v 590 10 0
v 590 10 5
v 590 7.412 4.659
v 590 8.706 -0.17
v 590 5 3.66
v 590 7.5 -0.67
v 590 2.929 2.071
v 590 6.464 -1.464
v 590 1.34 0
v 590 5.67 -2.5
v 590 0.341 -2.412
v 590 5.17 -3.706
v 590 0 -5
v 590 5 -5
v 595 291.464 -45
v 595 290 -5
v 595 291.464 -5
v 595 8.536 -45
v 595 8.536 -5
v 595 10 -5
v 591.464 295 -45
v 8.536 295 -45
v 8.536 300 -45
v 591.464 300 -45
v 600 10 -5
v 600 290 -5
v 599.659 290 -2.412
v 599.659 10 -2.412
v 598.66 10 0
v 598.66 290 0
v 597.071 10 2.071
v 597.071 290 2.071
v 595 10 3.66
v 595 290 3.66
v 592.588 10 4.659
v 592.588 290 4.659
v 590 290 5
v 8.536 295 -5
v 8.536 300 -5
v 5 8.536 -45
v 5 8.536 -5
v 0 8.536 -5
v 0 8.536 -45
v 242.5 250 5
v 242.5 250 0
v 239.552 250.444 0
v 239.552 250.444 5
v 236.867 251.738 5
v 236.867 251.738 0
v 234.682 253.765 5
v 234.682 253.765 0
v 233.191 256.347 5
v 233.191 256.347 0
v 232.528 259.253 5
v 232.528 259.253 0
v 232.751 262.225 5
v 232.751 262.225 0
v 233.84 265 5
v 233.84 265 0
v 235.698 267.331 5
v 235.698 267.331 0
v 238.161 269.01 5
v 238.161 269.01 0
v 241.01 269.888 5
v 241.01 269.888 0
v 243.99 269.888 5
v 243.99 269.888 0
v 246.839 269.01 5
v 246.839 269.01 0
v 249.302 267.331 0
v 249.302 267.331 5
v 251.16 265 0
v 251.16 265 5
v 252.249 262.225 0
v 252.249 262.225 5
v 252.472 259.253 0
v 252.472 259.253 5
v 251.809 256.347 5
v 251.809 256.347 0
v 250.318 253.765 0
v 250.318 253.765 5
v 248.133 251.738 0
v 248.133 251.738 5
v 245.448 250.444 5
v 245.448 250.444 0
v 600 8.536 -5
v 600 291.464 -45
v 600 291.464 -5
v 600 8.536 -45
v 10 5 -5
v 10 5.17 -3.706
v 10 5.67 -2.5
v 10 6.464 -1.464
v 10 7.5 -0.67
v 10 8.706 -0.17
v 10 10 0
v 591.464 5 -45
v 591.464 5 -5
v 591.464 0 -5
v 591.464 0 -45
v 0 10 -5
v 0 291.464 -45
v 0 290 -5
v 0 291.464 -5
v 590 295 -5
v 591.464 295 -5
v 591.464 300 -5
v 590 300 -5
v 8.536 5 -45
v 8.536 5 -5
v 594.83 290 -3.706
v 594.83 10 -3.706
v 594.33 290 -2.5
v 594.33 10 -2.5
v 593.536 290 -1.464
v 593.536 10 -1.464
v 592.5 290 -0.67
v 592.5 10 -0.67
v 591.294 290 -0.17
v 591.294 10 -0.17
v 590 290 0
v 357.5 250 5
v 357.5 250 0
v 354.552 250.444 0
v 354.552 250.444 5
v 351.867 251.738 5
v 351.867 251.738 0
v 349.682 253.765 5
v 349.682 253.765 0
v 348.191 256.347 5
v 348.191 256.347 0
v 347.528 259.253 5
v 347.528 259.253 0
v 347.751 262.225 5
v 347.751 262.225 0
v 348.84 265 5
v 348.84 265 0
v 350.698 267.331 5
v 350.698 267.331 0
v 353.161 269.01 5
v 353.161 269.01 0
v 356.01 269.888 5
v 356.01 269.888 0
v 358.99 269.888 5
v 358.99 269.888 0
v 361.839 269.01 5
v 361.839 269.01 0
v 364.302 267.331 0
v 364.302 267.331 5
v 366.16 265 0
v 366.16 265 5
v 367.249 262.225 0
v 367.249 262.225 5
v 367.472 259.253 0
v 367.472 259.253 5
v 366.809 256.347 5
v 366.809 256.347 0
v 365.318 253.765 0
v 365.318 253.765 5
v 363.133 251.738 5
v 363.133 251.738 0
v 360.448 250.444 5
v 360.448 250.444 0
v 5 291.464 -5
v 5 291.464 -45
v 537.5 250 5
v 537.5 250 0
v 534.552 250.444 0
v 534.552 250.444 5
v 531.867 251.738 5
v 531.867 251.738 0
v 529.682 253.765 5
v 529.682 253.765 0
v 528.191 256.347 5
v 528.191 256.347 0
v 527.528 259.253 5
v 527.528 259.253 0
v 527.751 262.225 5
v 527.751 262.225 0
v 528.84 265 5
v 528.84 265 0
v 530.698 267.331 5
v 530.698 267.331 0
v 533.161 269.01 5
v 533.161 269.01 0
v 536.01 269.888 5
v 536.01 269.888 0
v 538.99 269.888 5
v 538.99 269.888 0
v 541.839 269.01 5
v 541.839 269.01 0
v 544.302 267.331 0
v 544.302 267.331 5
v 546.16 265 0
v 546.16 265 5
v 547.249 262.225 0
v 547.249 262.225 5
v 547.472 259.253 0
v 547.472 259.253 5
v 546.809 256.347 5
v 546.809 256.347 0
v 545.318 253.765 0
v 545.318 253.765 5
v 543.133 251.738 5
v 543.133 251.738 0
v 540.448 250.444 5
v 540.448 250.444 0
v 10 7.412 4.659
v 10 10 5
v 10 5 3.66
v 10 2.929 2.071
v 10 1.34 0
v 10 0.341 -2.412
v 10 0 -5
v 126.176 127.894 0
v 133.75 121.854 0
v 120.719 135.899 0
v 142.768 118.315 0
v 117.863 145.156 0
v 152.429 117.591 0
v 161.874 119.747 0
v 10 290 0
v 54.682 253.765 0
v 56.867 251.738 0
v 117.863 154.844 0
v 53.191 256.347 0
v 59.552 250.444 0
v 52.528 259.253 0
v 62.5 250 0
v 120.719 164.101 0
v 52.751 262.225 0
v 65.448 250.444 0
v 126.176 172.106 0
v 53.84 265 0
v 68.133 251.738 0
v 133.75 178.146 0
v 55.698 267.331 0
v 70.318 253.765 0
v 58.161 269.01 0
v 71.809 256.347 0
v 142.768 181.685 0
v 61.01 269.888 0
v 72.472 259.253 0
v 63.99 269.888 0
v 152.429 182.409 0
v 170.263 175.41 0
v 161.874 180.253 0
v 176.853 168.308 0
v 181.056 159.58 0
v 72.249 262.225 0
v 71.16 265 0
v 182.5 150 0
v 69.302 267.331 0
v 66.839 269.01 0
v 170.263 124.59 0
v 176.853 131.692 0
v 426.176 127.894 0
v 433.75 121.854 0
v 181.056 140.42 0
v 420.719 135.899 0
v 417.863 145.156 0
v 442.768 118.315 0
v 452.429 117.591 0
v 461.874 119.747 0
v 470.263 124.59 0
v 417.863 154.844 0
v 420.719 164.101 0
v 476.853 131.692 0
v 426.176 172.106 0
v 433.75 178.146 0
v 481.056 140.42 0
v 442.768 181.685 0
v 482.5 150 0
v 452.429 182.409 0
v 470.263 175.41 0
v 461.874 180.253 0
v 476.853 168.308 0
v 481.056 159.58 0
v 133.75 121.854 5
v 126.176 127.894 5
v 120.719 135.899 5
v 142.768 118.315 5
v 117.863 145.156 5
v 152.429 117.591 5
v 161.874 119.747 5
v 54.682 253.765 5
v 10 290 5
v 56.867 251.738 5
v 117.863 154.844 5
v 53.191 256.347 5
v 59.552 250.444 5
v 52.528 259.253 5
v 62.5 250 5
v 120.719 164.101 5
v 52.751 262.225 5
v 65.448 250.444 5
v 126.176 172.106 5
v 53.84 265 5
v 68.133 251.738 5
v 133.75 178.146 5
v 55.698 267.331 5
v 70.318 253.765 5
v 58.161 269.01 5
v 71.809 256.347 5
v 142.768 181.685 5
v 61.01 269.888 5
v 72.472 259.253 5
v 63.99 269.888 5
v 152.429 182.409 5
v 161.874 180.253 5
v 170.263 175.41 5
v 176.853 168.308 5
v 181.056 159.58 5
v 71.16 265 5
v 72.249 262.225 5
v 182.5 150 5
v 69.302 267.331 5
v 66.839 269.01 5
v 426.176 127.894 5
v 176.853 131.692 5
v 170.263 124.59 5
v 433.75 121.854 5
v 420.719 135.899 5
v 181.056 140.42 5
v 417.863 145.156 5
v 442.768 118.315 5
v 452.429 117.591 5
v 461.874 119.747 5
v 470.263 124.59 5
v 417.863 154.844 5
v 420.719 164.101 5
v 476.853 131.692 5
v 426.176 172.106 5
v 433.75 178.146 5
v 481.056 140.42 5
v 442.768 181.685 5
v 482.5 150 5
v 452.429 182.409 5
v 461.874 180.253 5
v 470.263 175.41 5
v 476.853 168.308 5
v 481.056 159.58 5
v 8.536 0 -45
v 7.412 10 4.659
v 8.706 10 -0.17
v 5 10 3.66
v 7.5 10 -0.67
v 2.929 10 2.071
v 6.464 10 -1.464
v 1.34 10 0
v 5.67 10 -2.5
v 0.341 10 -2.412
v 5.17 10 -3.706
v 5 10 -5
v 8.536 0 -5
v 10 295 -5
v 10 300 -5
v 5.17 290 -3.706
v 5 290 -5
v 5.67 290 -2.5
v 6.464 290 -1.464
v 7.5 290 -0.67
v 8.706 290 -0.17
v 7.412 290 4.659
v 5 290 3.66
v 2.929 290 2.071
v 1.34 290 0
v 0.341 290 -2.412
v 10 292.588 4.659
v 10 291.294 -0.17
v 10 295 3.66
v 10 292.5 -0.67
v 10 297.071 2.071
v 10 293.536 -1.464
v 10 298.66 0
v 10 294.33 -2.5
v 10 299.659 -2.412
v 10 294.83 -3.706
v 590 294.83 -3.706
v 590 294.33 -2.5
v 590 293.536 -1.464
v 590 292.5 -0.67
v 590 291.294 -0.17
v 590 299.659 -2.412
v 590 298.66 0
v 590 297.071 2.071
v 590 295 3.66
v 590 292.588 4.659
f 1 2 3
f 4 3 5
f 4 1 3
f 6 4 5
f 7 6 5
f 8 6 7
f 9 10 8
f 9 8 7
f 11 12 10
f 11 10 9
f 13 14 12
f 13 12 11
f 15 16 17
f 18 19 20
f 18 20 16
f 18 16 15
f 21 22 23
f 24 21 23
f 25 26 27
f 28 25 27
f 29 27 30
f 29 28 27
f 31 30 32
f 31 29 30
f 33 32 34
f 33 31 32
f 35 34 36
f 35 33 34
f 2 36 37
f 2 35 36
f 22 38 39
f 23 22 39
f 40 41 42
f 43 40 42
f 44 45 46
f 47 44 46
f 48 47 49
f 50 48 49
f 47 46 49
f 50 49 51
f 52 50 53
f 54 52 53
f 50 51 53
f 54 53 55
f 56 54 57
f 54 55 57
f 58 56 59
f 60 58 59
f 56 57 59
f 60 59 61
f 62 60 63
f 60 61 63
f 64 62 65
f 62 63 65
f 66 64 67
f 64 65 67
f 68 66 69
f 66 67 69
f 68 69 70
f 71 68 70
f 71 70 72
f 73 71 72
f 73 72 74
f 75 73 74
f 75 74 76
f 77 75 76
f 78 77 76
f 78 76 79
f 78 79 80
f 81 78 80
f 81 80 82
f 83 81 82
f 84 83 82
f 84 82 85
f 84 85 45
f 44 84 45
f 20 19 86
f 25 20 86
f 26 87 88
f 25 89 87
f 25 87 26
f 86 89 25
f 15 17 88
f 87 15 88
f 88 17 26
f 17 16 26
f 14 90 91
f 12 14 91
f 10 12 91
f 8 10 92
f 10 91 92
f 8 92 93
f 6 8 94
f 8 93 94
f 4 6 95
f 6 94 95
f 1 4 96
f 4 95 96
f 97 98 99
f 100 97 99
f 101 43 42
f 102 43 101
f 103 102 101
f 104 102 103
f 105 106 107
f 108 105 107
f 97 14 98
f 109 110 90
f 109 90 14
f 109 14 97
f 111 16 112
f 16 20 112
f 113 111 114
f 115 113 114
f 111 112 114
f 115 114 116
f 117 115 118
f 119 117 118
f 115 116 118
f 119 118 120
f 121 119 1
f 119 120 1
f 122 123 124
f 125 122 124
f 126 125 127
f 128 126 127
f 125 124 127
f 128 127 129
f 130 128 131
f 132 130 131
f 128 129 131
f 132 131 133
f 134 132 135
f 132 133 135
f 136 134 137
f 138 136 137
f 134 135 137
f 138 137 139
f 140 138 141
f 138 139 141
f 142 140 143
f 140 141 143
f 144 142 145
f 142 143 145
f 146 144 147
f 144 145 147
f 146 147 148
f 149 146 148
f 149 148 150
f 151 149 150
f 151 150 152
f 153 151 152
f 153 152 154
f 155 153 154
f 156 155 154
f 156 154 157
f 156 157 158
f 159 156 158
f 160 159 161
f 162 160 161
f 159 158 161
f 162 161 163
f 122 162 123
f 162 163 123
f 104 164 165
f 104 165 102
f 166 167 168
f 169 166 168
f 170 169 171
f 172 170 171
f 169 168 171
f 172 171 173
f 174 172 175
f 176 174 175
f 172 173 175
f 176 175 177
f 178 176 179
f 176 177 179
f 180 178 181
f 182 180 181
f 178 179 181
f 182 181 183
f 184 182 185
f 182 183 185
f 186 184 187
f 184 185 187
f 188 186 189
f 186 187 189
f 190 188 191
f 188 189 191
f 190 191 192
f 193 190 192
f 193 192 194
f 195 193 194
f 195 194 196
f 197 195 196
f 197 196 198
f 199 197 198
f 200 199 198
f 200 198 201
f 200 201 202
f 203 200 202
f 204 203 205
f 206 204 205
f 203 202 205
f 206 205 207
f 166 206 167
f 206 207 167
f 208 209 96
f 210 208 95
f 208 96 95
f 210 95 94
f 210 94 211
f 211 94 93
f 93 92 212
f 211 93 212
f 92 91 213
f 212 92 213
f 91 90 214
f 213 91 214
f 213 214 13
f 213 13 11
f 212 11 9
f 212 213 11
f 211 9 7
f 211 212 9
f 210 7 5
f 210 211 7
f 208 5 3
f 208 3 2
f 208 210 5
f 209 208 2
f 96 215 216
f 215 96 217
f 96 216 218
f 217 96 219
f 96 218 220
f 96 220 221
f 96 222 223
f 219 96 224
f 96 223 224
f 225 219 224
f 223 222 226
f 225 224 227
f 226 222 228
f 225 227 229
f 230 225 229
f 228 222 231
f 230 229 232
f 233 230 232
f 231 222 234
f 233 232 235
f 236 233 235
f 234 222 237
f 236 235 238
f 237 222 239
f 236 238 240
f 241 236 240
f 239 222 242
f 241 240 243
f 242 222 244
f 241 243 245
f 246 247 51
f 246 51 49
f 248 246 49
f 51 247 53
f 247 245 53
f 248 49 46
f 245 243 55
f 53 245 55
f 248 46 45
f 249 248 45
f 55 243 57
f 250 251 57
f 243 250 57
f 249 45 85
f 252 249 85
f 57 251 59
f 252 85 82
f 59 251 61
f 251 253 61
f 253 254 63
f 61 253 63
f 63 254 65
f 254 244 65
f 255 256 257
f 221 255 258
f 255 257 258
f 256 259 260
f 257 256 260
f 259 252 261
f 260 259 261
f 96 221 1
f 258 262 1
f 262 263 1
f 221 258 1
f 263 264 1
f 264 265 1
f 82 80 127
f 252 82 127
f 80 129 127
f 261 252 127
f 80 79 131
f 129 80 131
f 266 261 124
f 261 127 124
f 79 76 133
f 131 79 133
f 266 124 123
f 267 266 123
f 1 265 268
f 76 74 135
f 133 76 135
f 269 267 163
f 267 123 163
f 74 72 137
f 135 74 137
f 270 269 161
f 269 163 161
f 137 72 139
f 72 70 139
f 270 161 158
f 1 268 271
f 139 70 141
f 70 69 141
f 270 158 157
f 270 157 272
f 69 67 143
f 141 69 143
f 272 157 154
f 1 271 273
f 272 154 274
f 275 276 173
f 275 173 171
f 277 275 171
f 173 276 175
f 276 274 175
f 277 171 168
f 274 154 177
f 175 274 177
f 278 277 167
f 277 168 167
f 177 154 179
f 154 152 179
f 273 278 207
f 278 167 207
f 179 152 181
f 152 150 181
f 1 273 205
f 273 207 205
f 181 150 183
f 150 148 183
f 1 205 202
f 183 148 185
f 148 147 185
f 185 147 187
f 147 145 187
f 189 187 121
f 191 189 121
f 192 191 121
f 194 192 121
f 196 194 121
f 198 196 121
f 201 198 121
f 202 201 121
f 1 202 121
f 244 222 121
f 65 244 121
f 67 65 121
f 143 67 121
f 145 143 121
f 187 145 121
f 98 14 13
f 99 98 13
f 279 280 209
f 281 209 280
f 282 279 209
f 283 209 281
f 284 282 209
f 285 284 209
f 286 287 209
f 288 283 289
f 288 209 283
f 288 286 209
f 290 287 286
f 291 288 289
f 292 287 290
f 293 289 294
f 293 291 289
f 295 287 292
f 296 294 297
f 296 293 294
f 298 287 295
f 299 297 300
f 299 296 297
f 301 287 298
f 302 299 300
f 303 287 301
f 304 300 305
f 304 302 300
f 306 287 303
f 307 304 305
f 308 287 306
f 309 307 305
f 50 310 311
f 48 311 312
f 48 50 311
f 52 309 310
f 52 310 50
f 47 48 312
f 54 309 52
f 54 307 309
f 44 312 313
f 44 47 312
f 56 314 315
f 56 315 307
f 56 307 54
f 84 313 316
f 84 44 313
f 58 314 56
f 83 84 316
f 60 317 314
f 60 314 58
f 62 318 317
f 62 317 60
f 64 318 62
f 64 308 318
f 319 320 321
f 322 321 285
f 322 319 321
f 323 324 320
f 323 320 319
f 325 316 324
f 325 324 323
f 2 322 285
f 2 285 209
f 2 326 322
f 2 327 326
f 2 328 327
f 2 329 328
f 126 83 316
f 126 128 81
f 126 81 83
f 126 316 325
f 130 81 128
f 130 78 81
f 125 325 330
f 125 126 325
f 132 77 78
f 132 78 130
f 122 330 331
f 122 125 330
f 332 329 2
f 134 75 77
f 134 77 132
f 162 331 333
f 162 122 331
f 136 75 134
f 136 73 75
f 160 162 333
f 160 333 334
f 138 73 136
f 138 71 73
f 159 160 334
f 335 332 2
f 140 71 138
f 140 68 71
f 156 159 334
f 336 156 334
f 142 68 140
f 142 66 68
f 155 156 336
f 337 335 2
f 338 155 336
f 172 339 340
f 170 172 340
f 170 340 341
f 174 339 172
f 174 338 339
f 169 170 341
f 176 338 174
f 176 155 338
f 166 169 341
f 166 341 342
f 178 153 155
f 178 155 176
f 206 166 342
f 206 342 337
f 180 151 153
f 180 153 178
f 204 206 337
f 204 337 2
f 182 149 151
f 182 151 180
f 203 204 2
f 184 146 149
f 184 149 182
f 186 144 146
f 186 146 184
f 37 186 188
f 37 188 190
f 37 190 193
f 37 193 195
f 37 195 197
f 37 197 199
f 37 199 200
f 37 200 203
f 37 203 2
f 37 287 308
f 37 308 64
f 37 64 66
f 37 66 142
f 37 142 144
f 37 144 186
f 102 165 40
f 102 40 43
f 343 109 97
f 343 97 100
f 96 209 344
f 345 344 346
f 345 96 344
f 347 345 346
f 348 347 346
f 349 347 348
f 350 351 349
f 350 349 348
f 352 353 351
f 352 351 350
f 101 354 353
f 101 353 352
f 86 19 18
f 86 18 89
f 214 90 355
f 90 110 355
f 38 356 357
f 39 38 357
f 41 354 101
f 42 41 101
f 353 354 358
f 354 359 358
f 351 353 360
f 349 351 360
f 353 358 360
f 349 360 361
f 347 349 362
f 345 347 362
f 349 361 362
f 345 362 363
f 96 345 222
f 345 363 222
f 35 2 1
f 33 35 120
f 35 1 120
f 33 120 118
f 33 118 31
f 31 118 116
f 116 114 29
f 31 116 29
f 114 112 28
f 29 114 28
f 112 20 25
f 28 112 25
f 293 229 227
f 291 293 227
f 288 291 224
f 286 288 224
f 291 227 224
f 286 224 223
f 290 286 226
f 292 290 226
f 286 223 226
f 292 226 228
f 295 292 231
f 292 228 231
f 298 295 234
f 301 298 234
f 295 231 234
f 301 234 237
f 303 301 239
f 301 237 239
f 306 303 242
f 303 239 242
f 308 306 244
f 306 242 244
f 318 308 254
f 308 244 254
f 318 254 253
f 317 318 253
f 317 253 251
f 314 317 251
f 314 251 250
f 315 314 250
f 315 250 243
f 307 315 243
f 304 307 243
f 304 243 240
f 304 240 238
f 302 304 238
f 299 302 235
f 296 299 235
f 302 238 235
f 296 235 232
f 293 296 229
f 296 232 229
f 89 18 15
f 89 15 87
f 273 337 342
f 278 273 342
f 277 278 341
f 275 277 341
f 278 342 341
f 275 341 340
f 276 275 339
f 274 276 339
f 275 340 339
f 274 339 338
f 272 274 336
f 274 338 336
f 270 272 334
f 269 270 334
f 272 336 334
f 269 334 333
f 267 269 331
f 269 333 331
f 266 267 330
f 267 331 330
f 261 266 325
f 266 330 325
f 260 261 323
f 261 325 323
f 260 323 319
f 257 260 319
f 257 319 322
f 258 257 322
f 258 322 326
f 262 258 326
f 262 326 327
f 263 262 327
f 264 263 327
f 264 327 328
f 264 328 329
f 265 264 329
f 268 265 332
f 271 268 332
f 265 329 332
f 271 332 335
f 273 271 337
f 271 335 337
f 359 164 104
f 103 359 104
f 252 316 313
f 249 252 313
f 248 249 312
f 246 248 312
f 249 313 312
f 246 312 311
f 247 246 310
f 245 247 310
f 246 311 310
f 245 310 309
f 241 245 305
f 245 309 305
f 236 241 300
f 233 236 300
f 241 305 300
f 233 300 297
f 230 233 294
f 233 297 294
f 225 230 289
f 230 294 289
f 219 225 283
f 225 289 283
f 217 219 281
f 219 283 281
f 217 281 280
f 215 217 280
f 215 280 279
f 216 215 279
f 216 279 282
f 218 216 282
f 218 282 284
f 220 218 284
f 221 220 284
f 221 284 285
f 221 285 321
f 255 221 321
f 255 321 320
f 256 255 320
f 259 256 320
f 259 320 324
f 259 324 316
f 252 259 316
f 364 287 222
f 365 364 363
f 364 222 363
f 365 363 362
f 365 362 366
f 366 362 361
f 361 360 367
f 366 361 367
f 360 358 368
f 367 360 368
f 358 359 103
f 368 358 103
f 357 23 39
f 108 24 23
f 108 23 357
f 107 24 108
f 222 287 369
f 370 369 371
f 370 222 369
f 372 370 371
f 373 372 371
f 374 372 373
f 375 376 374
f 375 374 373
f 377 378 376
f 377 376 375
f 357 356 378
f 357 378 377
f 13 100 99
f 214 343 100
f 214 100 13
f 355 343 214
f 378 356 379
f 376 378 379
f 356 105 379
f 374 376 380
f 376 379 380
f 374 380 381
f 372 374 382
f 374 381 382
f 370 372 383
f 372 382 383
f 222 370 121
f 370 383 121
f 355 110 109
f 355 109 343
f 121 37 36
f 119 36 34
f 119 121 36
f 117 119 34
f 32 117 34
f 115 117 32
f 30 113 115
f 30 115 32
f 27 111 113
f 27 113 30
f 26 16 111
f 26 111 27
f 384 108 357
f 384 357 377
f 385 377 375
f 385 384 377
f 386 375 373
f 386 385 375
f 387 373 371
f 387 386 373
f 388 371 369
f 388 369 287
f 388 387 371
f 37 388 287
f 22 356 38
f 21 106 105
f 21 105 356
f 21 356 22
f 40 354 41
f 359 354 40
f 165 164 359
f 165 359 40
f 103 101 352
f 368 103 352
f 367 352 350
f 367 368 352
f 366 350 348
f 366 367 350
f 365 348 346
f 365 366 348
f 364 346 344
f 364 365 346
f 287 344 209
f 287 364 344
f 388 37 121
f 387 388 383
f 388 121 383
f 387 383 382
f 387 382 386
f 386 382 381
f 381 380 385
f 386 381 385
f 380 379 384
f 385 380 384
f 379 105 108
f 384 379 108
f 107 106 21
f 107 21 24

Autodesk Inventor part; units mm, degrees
ref_plane "YZ Plane" through (0, 0, 0) normal (1, 0, 0) x (0, 1, 0)
ref_plane "XZ Plane" through (0, 0, 0) normal (0, 1, 0) x (-1, 0, 0)
ref_plane "XY Plane" through (0, 0, 0) normal (0, 0, 1) x (1, 0, 0)
sketch "Sketch1" plane through (0, 0, 0) normal (0, 0, 1) x (1, 0, 0)
  line L0 (0, 0) -> (600, 0)
  line L1 (600, 0) -> (600, 300)
  line L2 (600, 300) -> (0, 300)
  line L3 (0, 300) -> (0, 0)
  dimension "d0" = 300
  dimension "d1" = 600
extrude "Plate1" add sketch "Sketch1" along normal blind 5
sketch "Sketch2" plane through (595, 0, 5) normal (1, 0, 0) x (0, 1, 0)
  line L0 (300, 0) -> (0, 0)
  line L1 (0, 0) -> (0, -50)
  line L2 (0, -50) -> (300, -50)
  line L3 (300, -50) -> (300, 0)
edge flange "Flange1" height 50 angle 90 thickness 5 bend radius 5 thickness toward (1, 0, 0) relief tear relief width 5 relief depth 2.5 corner gap 5 corner form 2 edges at (600, 150, 0) (0, 150, 0) (300, 0, 0) (300, 300, 0) wall of the first edge with corners at (595, 300, 5) (595, 0, 5) (595, 0, -45) (595, 300, -45)
bend "Bend1"
corner "Corner1"
sketch "Sketch3" plane through (0, 0, 5) normal (0, 0, 1) x (1, 0, 0)
  circle A0 centre (150, 150) radius 32.5
  circle A1 centre (450, 150) radius 32.5
  point P0 (0, 0)
  dimension "d13" = 65
  dimension "d14" = 65
extrude "Extrusion1" cut sketch "Sketch3" against normal blind 10
sketch "Sketch4" plane through (0, 0, 5) normal (0, 0, 1) x (1, 0, 0)
  circle A0 centre (62.5, 260) radius 10 projected
  circle A1 centre (242.5, 260) radius 10 projected
  circle A2 centre (357.5, 260) radius 10 projected
  circle A3 centre (537.5, 260) radius 10 projected
  line L0 (22.5, 236) -> (577.5, 236) projected
  line L1 (577.5, 304) -> (577.5, 236) projected
  line L2 (22.5, 304) -> (22.5, 236) projected
  line L3 (577.5, 304) -> (22.5, 304) projected
  point P0 (0, 0)
hole "Hole1" at (537.5, 260, 5) at (357.5, 260, 5) at (242.5, 260, 5) at (62.5, 260, 5) direction (0, 0, -1) diameter 20 depth 5 tip angle 118
equation "\"d22\" = Thickness"
equation "\"d3\" = BendReliefWidth"
equation "\"d4\" = BendReliefDepth"
equation "\"d5\" = MinimumRemnant"
equation "\"d6\" = BendRadius"
equation "\"d9\" = BendRadius"
equation "\"d10\" = CornerReliefSize"
equation "\"d11\" = GapSize"
equation "\"d12\" = JacobiRadiusSize"
equation "\"BendRadius\" = Thickness"
equation "\"BendReliefWidth\" = Thickness"
equation "\"BendReliefDepth\" = 0.5 * Thickness"
equation "\"TransitionRadius\" = BendRadius"
equation "\"JacobiRadiusSize\" = BendRadius"
equation "\"GapSize\" = Thickness"
equation "\"d2\" = BendRadius"
equation "\"Thickness\" = 5"
equation "\"MinimumRemnant\" = 10"
equation "\"CornerReliefSize\" = 20"
properties part number "Side Plate"
